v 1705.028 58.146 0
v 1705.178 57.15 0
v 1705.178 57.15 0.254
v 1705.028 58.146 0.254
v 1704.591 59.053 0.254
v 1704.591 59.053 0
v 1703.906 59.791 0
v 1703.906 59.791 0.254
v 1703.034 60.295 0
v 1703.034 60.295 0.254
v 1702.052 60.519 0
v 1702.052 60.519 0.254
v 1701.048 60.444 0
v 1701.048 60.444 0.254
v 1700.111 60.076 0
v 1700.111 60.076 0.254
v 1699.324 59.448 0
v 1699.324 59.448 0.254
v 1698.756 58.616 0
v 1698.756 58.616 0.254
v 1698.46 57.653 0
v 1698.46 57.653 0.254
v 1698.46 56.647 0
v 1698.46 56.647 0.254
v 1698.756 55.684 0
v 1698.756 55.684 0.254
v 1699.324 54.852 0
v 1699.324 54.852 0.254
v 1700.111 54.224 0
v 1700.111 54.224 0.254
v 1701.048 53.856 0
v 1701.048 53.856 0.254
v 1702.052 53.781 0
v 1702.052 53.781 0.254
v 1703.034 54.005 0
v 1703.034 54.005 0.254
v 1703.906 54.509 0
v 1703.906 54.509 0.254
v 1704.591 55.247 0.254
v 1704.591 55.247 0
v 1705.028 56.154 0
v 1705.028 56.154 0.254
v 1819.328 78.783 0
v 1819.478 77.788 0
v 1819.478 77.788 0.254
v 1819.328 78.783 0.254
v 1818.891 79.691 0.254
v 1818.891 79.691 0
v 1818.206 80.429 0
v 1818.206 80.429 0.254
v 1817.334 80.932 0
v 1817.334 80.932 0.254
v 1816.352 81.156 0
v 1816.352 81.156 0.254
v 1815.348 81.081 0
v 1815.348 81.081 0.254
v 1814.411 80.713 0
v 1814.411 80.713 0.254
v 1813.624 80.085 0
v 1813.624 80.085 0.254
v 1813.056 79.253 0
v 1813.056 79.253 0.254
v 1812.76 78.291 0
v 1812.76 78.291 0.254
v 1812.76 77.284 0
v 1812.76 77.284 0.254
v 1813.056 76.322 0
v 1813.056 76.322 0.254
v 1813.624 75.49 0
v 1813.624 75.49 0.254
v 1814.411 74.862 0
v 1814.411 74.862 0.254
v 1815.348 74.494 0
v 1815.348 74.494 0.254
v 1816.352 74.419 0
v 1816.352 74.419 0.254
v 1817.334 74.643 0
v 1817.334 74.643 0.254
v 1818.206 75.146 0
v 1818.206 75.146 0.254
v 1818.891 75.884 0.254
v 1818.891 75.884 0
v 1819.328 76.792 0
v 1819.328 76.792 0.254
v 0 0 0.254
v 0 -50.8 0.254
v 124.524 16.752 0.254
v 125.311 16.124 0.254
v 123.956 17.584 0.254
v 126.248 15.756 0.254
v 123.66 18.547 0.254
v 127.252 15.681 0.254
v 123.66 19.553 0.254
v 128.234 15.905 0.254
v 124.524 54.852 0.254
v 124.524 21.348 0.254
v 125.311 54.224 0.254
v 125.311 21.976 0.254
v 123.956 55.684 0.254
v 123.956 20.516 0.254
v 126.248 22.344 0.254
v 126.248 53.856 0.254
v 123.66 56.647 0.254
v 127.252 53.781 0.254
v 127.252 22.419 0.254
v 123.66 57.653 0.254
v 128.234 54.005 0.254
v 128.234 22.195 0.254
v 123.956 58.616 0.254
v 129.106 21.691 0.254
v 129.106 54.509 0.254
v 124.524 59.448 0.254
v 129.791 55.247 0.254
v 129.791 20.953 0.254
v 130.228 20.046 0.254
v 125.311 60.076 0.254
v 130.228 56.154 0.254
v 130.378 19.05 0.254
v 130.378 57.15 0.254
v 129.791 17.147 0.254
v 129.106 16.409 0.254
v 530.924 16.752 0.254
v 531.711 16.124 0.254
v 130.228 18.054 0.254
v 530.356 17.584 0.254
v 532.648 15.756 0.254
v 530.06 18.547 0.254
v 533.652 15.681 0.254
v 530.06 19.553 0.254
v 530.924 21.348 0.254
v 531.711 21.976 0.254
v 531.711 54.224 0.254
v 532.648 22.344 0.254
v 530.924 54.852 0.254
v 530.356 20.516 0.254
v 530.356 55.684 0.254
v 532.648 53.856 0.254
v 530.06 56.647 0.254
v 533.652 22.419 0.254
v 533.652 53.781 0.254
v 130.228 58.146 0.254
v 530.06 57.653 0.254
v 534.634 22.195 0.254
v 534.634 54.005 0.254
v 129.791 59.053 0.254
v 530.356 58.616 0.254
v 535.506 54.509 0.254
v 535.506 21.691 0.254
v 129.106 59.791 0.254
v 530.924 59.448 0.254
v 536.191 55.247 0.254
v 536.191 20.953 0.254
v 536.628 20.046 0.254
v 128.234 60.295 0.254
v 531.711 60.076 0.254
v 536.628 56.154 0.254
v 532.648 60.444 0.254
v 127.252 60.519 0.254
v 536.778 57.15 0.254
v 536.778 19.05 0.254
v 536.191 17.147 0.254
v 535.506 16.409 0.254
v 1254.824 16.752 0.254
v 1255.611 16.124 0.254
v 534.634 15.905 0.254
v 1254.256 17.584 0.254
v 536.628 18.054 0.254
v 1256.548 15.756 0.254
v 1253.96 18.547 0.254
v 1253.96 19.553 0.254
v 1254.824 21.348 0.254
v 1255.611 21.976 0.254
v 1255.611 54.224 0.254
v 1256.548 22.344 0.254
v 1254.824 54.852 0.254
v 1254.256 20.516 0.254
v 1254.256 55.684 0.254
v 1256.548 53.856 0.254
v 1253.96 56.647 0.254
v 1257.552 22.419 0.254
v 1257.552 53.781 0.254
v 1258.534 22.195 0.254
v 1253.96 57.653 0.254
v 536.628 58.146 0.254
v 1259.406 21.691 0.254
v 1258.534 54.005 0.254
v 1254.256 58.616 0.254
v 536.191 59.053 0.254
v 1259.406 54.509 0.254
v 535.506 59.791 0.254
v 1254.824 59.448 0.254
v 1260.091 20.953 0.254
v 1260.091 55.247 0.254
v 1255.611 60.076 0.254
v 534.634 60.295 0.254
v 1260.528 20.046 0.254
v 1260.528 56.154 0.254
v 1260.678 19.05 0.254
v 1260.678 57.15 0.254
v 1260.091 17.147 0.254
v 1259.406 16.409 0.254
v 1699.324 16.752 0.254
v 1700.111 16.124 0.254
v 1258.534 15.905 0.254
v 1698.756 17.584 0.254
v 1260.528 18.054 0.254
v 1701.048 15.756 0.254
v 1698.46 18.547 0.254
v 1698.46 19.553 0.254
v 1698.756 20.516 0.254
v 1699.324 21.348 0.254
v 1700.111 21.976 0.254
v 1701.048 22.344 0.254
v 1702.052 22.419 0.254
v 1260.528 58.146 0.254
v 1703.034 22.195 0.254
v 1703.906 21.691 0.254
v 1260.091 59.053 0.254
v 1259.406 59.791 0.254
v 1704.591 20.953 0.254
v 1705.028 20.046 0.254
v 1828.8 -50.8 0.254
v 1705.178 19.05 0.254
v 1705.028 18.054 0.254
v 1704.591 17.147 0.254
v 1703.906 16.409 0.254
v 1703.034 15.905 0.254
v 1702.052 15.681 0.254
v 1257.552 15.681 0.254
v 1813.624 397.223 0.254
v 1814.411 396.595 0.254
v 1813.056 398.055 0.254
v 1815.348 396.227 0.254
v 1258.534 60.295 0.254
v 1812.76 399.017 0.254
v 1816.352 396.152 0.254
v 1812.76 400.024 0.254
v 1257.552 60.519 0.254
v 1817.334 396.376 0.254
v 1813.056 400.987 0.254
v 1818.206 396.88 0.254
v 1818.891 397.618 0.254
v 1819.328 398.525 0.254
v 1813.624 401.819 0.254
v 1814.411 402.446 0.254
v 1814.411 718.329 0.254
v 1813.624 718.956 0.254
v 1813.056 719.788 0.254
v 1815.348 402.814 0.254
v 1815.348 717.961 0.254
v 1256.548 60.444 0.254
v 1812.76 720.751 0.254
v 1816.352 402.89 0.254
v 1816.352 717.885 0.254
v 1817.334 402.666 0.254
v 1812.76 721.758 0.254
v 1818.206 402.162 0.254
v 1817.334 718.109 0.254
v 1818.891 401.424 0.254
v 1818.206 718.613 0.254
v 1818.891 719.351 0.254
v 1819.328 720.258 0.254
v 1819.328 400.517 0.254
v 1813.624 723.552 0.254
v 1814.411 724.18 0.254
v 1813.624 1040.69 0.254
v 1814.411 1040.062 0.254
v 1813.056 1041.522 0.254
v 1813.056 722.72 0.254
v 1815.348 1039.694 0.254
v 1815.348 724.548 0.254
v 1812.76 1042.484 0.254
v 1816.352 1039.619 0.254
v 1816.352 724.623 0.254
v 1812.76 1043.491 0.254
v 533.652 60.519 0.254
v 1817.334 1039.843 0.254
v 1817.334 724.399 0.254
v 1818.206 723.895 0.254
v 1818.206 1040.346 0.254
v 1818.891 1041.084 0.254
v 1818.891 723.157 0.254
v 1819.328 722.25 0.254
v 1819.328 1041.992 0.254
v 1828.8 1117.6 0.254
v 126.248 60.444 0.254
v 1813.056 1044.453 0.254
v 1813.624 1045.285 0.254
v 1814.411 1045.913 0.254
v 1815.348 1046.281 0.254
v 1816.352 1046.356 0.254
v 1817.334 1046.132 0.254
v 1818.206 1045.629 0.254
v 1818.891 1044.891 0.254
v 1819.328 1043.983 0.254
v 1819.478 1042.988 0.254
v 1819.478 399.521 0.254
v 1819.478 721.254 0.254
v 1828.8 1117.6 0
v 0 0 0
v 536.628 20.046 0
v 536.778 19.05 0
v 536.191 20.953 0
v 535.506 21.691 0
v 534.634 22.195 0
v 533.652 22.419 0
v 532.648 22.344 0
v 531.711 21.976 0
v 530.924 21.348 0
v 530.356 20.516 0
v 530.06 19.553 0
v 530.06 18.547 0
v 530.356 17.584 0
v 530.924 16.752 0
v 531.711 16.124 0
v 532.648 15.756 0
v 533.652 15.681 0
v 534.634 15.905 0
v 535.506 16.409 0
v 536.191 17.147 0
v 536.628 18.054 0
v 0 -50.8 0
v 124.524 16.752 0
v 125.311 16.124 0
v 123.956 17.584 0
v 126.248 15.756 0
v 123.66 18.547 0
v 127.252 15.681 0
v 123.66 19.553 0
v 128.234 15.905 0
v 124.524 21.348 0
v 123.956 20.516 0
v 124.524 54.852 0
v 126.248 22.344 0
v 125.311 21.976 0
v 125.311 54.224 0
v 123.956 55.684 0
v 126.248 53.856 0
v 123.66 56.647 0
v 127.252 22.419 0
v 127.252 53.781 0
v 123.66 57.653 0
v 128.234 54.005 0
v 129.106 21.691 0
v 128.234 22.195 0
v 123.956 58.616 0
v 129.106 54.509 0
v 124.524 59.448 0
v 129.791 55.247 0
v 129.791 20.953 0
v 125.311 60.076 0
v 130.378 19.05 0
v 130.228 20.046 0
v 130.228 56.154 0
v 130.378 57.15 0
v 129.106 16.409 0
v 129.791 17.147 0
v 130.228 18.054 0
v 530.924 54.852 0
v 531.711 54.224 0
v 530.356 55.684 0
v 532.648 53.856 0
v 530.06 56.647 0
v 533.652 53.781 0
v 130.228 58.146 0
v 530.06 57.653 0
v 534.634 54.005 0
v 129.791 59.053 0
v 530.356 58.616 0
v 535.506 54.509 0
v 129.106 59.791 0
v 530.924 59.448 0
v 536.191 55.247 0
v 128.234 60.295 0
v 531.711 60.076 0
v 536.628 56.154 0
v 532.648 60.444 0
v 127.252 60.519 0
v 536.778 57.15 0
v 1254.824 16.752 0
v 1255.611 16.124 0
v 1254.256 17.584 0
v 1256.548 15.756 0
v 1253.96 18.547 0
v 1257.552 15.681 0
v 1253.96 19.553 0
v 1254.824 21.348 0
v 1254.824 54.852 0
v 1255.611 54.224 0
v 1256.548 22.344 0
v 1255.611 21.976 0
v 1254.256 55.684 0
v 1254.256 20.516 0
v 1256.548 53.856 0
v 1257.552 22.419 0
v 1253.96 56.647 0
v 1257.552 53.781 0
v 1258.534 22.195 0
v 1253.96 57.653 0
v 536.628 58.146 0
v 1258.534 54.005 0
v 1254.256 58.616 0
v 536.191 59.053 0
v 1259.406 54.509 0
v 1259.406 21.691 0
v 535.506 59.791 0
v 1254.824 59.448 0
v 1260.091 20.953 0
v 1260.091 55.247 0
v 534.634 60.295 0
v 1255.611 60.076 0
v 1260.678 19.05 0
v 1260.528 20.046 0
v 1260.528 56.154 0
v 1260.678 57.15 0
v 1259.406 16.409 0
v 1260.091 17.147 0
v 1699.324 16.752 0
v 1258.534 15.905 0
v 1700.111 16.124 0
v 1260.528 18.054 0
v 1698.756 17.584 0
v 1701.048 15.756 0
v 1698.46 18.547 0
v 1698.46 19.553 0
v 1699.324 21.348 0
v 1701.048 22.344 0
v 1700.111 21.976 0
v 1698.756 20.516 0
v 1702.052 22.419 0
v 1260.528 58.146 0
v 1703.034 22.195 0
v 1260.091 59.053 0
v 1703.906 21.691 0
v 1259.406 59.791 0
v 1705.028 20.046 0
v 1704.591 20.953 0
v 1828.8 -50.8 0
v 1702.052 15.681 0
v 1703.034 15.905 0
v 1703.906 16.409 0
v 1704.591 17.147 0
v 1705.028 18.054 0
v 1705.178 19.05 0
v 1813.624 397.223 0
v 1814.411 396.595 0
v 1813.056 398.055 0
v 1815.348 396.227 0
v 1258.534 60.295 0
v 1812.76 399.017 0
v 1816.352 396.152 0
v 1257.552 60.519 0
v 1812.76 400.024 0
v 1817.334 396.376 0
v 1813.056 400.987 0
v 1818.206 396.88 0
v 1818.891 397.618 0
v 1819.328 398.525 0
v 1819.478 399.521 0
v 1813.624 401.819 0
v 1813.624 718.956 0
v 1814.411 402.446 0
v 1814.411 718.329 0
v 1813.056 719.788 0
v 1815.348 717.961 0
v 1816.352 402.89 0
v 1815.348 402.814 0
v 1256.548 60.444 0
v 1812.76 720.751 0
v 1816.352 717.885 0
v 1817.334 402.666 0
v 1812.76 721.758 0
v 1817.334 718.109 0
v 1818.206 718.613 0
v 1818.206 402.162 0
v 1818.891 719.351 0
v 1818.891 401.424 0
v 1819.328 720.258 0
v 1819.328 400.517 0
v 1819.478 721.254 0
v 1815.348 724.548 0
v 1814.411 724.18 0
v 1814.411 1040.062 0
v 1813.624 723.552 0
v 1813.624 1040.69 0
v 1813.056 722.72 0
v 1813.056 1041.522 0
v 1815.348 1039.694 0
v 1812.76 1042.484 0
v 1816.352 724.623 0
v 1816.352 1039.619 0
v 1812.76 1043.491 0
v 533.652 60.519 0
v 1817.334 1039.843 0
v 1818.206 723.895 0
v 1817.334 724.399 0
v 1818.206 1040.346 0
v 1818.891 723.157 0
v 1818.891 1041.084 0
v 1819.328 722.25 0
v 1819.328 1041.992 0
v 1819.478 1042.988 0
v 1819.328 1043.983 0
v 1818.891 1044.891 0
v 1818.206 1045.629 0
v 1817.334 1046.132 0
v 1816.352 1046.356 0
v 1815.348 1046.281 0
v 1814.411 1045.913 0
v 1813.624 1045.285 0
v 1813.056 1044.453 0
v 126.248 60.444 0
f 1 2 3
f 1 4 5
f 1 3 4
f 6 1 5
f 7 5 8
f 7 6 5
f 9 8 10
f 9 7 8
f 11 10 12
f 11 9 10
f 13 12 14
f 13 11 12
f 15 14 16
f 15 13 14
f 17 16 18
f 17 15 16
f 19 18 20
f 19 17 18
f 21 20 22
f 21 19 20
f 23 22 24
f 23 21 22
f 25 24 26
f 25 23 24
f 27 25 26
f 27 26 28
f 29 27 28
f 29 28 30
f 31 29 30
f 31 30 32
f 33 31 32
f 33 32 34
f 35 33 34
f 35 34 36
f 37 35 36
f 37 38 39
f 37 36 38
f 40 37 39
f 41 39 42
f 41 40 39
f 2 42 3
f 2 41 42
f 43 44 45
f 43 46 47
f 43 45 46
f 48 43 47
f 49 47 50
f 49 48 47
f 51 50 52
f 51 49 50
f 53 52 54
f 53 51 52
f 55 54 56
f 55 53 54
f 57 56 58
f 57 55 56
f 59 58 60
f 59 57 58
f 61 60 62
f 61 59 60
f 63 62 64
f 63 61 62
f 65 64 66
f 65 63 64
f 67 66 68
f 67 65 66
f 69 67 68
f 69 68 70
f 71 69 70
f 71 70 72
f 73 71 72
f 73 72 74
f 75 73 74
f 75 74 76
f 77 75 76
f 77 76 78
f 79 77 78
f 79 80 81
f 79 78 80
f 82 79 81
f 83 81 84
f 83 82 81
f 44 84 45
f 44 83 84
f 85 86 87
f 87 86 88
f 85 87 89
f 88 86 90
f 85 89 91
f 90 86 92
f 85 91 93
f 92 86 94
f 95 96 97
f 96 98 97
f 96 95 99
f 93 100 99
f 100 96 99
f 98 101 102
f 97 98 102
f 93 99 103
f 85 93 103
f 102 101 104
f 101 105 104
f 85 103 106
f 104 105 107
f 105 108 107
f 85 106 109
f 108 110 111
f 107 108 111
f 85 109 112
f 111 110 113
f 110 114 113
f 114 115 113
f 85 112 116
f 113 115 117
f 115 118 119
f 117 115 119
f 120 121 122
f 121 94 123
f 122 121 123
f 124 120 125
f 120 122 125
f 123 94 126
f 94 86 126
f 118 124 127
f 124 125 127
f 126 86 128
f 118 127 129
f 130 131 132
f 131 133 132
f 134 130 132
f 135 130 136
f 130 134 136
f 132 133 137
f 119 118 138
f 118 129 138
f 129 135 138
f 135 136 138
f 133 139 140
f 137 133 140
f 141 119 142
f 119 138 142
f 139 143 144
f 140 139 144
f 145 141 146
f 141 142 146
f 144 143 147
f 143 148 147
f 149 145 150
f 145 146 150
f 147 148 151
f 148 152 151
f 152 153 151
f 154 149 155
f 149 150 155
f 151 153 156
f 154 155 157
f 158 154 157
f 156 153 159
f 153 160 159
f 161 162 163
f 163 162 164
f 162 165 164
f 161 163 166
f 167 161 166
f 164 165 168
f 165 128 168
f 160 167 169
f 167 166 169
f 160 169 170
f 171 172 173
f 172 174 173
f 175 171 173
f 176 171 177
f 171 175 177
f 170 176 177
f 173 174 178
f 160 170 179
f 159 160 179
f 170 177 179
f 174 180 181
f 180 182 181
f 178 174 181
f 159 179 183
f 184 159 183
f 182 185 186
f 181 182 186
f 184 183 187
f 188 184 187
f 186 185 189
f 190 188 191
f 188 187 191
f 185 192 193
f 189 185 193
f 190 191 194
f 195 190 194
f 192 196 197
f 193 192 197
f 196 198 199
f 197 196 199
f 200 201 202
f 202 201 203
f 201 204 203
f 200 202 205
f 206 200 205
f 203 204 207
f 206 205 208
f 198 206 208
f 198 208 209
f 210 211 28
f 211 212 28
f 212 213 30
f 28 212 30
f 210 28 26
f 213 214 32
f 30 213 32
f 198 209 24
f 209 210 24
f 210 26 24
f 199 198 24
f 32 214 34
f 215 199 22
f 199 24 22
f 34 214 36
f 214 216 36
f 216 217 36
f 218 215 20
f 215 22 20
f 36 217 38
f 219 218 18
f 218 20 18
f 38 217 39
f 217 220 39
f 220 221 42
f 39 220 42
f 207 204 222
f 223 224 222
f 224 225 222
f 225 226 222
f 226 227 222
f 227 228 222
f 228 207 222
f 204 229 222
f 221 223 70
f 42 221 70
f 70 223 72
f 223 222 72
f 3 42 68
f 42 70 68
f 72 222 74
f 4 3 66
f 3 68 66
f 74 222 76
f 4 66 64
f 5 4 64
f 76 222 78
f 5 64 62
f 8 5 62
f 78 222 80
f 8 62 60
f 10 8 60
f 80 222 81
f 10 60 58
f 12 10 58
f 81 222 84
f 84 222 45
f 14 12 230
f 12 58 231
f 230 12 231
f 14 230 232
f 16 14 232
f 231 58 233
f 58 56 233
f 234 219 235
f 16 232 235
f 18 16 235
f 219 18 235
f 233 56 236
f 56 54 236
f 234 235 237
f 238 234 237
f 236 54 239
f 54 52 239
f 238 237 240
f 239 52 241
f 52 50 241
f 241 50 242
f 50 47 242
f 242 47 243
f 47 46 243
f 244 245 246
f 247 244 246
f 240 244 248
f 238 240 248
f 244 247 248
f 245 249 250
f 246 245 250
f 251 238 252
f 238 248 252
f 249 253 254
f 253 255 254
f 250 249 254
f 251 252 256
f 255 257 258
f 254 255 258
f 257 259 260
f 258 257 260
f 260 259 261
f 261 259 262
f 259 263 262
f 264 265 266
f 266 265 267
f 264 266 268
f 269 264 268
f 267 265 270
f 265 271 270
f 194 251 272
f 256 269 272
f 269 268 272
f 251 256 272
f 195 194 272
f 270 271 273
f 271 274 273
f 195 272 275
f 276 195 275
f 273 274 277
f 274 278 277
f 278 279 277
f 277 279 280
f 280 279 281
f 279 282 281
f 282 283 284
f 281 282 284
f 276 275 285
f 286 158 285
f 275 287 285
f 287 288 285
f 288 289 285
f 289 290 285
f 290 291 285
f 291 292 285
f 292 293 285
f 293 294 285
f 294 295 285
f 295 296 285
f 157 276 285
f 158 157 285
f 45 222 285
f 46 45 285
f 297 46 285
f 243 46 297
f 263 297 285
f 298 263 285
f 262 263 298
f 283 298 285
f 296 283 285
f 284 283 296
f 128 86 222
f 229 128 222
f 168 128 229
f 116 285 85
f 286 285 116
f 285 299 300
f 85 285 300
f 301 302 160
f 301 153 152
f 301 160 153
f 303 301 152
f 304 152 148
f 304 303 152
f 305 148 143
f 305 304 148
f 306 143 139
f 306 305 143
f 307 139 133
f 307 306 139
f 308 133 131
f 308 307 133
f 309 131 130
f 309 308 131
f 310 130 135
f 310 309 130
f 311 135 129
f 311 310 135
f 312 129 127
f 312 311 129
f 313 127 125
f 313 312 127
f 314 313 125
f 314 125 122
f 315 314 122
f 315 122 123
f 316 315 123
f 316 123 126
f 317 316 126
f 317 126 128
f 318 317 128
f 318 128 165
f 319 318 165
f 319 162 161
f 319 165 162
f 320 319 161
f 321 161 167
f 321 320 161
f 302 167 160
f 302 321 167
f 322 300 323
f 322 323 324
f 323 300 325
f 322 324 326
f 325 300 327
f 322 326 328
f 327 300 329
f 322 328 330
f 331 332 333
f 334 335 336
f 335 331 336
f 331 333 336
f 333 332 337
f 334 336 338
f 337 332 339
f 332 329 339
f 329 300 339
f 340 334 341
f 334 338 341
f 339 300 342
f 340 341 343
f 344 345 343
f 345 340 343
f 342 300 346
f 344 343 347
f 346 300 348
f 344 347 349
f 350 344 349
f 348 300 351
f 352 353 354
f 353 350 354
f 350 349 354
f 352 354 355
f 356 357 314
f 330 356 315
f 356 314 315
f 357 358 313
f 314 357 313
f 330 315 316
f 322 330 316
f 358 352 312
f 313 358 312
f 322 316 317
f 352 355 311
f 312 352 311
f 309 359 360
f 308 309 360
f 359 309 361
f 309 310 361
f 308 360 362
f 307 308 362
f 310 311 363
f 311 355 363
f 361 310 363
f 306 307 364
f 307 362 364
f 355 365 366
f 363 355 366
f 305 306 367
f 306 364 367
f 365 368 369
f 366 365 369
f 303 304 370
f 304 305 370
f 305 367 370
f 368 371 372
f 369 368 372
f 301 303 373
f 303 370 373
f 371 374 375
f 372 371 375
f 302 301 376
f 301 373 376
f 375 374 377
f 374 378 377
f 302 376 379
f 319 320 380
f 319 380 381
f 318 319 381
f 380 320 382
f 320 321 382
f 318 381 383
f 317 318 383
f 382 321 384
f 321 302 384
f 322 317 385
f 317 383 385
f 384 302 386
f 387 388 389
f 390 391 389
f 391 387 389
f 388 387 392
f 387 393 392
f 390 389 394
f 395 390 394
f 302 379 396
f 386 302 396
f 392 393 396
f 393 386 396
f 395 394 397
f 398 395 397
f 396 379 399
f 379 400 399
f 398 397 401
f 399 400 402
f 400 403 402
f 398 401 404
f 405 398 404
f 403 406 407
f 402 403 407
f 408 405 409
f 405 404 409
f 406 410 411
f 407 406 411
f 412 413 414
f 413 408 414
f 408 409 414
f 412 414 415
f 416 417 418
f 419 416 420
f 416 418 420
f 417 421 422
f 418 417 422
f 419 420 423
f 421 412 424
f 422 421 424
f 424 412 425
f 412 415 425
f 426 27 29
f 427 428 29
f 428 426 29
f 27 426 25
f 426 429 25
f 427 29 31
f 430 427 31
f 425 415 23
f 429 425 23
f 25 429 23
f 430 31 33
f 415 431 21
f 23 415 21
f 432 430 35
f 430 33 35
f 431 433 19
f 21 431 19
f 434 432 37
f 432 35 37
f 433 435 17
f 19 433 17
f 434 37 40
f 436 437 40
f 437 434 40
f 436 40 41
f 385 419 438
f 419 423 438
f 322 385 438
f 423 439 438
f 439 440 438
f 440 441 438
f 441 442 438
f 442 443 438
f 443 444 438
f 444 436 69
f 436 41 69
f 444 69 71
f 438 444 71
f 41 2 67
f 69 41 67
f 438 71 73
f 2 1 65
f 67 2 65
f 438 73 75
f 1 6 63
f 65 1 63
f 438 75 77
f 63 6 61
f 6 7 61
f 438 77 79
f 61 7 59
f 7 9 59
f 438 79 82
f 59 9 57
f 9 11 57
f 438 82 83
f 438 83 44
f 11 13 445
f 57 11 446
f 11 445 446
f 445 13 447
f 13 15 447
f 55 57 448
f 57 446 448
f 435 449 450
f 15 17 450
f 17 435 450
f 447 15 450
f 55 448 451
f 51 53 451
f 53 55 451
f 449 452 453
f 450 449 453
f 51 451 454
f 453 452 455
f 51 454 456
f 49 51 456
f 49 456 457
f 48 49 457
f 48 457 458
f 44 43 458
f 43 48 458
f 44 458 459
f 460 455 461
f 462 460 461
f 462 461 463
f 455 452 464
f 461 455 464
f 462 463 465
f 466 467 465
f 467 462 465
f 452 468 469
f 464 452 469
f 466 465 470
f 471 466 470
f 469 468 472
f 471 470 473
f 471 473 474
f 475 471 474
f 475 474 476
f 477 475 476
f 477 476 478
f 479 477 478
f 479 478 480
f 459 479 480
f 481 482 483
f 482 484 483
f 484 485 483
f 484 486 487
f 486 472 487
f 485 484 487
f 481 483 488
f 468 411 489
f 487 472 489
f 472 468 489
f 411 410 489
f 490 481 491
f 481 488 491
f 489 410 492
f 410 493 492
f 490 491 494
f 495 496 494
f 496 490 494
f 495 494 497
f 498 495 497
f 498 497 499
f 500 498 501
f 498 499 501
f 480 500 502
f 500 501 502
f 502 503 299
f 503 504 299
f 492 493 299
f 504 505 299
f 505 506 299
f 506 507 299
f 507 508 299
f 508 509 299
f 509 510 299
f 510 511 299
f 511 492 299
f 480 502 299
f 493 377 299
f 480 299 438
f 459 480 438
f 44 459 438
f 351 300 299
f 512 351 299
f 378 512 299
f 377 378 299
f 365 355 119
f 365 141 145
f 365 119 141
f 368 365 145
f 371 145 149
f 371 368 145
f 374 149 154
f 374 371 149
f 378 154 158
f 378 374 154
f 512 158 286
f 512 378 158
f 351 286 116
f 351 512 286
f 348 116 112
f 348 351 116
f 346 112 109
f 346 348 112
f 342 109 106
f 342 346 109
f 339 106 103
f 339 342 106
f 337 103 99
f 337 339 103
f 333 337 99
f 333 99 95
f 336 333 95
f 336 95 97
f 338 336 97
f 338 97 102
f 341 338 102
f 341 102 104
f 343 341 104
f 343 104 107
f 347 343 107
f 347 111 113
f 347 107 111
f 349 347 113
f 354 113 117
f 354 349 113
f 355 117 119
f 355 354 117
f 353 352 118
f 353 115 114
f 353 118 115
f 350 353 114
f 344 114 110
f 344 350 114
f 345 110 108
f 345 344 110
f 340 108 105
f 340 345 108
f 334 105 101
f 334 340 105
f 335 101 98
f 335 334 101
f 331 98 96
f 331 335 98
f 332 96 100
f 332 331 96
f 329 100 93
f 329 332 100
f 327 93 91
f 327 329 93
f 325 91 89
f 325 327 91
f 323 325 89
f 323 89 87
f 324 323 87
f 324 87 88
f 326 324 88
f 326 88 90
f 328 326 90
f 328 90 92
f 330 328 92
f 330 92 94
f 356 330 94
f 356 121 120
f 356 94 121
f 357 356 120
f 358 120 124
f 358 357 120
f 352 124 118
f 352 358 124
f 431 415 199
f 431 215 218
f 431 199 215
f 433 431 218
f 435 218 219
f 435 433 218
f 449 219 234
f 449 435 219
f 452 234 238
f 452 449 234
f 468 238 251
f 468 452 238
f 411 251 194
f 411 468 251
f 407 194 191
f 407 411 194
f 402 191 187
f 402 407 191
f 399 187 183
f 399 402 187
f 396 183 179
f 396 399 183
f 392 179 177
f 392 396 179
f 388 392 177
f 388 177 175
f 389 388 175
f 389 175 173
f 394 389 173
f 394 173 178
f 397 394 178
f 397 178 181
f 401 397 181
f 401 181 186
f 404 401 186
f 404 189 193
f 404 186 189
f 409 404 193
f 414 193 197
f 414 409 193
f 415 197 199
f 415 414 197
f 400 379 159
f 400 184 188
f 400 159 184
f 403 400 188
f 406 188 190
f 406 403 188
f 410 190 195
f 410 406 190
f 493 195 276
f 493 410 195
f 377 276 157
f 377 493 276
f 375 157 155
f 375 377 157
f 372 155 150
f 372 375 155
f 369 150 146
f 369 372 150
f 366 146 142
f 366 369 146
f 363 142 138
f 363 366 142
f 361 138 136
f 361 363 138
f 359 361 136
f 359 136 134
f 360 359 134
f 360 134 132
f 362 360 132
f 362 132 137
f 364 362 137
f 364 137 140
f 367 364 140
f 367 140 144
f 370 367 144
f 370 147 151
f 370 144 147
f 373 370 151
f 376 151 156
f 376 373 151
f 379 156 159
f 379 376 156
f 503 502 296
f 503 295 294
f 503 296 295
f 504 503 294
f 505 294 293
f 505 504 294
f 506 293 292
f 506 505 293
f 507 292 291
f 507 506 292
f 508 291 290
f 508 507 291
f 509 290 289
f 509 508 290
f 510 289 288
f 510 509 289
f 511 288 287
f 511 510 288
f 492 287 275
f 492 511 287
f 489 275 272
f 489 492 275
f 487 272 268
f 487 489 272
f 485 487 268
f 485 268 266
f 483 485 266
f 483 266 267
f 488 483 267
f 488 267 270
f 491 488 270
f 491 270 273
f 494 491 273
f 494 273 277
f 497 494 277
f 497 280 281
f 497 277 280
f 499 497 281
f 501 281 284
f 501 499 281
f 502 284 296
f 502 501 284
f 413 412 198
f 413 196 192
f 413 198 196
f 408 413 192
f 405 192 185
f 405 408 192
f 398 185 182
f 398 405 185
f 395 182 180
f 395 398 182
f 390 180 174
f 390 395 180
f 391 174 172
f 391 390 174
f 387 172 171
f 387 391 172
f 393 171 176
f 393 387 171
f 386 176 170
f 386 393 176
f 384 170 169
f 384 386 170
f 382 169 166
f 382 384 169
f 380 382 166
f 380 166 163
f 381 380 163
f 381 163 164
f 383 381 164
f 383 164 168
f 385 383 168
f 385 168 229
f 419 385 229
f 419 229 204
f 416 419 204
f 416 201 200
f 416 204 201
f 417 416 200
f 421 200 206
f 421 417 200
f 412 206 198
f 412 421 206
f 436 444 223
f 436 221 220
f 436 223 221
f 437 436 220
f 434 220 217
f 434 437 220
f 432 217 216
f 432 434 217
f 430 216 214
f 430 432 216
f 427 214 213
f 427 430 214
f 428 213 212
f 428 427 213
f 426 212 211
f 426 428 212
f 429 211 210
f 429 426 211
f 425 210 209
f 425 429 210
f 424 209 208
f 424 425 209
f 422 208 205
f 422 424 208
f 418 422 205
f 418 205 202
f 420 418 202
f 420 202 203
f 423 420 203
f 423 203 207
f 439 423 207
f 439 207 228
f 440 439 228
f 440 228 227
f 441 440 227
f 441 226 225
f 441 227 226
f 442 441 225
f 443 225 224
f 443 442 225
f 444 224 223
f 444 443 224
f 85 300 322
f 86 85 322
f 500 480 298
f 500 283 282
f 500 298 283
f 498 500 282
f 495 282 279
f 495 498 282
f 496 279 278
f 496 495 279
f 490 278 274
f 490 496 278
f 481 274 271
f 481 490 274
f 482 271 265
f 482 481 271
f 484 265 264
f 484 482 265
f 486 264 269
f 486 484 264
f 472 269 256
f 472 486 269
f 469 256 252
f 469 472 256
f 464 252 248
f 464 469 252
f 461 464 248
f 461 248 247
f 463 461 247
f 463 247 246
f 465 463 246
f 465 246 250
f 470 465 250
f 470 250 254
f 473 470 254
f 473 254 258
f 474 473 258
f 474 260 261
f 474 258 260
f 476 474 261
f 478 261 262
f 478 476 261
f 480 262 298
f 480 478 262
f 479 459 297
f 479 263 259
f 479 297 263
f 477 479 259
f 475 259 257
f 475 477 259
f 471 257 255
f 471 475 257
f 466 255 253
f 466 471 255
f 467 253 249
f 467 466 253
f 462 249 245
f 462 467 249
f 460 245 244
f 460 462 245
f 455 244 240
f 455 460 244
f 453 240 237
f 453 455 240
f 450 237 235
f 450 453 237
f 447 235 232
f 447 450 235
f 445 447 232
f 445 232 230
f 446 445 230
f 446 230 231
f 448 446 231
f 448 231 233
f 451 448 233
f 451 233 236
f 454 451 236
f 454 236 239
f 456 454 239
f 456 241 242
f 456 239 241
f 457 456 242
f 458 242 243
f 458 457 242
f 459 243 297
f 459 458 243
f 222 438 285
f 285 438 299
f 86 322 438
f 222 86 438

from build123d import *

# Parameters (mm, degrees)
GE_20327_OUTLINE_R = 3.3782
GE_20327_DEPTH     = 3.175
SKETCH3_W          = 2.921
SKETCH3_H          = 1168.4
CUT_EXTRUDE1_DEPTH = 2144.256699657


# Read off the part's stored shape, not the designer's step: GE-20327
with BuildPart() as part:
    # GE-20327 outline → GE-20327 (new body)
    with BuildSketch(Plane.XY):
        Polygon((1828.8, -50.8), (1828.8, 1117.6), (0, 0), (0, -50.8), align=None)
        with Locations((127, 19.05)):
            Circle(GE_20327_OUTLINE_R, mode=Mode.SUBTRACT)
        with Locations((127, 57.15)):
            Circle(GE_20327_OUTLINE_R, mode=Mode.SUBTRACT)
        with Locations((533.4, 19.05)):
            Circle(GE_20327_OUTLINE_R, mode=Mode.SUBTRACT)
        with Locations((533.4, 57.15)):
            Circle(GE_20327_OUTLINE_R, mode=Mode.SUBTRACT)
        with Locations((1257.3, 19.05)):
            Circle(GE_20327_OUTLINE_R, mode=Mode.SUBTRACT)
        with Locations((1257.3, 57.15)):
            Circle(GE_20327_OUTLINE_R, mode=Mode.SUBTRACT)
        with Locations((1701.8, 19.05)):
            Circle(GE_20327_OUTLINE_R, mode=Mode.SUBTRACT)
        with Locations((1701.8, 57.15)):
            Circle(GE_20327_OUTLINE_R, mode=Mode.SUBTRACT)
        with Locations((1816.1, 77.7875)):
            Circle(GE_20327_OUTLINE_R, mode=Mode.SUBTRACT)
        with Locations((1816.1, 399.520833333)):
            Circle(GE_20327_OUTLINE_R, mode=Mode.SUBTRACT)
        with Locations((1816.1, 721.254166667)):
            Circle(GE_20327_OUTLINE_R, mode=Mode.SUBTRACT)
        with Locations((1816.1, 1042.9875)):
            Circle(GE_20327_OUTLINE_R, mode=Mode.SUBTRACT)
    extrude(amount=GE_20327_DEPTH)

    # Sketch3 → Cut-Extrude1 (cut, through all)
    with BuildSketch(Plane(origin=(1828.8, 0, 0), x_dir=(0, 0, -1), z_dir=(1, 0, 0))):
        with Locations((-1.7145, 533.4)):
            Rectangle(SKETCH3_W, SKETCH3_H)
    extrude(amount=-CUT_EXTRUDE1_DEPTH, mode=Mode.SUBTRACT)


solid = part.part
